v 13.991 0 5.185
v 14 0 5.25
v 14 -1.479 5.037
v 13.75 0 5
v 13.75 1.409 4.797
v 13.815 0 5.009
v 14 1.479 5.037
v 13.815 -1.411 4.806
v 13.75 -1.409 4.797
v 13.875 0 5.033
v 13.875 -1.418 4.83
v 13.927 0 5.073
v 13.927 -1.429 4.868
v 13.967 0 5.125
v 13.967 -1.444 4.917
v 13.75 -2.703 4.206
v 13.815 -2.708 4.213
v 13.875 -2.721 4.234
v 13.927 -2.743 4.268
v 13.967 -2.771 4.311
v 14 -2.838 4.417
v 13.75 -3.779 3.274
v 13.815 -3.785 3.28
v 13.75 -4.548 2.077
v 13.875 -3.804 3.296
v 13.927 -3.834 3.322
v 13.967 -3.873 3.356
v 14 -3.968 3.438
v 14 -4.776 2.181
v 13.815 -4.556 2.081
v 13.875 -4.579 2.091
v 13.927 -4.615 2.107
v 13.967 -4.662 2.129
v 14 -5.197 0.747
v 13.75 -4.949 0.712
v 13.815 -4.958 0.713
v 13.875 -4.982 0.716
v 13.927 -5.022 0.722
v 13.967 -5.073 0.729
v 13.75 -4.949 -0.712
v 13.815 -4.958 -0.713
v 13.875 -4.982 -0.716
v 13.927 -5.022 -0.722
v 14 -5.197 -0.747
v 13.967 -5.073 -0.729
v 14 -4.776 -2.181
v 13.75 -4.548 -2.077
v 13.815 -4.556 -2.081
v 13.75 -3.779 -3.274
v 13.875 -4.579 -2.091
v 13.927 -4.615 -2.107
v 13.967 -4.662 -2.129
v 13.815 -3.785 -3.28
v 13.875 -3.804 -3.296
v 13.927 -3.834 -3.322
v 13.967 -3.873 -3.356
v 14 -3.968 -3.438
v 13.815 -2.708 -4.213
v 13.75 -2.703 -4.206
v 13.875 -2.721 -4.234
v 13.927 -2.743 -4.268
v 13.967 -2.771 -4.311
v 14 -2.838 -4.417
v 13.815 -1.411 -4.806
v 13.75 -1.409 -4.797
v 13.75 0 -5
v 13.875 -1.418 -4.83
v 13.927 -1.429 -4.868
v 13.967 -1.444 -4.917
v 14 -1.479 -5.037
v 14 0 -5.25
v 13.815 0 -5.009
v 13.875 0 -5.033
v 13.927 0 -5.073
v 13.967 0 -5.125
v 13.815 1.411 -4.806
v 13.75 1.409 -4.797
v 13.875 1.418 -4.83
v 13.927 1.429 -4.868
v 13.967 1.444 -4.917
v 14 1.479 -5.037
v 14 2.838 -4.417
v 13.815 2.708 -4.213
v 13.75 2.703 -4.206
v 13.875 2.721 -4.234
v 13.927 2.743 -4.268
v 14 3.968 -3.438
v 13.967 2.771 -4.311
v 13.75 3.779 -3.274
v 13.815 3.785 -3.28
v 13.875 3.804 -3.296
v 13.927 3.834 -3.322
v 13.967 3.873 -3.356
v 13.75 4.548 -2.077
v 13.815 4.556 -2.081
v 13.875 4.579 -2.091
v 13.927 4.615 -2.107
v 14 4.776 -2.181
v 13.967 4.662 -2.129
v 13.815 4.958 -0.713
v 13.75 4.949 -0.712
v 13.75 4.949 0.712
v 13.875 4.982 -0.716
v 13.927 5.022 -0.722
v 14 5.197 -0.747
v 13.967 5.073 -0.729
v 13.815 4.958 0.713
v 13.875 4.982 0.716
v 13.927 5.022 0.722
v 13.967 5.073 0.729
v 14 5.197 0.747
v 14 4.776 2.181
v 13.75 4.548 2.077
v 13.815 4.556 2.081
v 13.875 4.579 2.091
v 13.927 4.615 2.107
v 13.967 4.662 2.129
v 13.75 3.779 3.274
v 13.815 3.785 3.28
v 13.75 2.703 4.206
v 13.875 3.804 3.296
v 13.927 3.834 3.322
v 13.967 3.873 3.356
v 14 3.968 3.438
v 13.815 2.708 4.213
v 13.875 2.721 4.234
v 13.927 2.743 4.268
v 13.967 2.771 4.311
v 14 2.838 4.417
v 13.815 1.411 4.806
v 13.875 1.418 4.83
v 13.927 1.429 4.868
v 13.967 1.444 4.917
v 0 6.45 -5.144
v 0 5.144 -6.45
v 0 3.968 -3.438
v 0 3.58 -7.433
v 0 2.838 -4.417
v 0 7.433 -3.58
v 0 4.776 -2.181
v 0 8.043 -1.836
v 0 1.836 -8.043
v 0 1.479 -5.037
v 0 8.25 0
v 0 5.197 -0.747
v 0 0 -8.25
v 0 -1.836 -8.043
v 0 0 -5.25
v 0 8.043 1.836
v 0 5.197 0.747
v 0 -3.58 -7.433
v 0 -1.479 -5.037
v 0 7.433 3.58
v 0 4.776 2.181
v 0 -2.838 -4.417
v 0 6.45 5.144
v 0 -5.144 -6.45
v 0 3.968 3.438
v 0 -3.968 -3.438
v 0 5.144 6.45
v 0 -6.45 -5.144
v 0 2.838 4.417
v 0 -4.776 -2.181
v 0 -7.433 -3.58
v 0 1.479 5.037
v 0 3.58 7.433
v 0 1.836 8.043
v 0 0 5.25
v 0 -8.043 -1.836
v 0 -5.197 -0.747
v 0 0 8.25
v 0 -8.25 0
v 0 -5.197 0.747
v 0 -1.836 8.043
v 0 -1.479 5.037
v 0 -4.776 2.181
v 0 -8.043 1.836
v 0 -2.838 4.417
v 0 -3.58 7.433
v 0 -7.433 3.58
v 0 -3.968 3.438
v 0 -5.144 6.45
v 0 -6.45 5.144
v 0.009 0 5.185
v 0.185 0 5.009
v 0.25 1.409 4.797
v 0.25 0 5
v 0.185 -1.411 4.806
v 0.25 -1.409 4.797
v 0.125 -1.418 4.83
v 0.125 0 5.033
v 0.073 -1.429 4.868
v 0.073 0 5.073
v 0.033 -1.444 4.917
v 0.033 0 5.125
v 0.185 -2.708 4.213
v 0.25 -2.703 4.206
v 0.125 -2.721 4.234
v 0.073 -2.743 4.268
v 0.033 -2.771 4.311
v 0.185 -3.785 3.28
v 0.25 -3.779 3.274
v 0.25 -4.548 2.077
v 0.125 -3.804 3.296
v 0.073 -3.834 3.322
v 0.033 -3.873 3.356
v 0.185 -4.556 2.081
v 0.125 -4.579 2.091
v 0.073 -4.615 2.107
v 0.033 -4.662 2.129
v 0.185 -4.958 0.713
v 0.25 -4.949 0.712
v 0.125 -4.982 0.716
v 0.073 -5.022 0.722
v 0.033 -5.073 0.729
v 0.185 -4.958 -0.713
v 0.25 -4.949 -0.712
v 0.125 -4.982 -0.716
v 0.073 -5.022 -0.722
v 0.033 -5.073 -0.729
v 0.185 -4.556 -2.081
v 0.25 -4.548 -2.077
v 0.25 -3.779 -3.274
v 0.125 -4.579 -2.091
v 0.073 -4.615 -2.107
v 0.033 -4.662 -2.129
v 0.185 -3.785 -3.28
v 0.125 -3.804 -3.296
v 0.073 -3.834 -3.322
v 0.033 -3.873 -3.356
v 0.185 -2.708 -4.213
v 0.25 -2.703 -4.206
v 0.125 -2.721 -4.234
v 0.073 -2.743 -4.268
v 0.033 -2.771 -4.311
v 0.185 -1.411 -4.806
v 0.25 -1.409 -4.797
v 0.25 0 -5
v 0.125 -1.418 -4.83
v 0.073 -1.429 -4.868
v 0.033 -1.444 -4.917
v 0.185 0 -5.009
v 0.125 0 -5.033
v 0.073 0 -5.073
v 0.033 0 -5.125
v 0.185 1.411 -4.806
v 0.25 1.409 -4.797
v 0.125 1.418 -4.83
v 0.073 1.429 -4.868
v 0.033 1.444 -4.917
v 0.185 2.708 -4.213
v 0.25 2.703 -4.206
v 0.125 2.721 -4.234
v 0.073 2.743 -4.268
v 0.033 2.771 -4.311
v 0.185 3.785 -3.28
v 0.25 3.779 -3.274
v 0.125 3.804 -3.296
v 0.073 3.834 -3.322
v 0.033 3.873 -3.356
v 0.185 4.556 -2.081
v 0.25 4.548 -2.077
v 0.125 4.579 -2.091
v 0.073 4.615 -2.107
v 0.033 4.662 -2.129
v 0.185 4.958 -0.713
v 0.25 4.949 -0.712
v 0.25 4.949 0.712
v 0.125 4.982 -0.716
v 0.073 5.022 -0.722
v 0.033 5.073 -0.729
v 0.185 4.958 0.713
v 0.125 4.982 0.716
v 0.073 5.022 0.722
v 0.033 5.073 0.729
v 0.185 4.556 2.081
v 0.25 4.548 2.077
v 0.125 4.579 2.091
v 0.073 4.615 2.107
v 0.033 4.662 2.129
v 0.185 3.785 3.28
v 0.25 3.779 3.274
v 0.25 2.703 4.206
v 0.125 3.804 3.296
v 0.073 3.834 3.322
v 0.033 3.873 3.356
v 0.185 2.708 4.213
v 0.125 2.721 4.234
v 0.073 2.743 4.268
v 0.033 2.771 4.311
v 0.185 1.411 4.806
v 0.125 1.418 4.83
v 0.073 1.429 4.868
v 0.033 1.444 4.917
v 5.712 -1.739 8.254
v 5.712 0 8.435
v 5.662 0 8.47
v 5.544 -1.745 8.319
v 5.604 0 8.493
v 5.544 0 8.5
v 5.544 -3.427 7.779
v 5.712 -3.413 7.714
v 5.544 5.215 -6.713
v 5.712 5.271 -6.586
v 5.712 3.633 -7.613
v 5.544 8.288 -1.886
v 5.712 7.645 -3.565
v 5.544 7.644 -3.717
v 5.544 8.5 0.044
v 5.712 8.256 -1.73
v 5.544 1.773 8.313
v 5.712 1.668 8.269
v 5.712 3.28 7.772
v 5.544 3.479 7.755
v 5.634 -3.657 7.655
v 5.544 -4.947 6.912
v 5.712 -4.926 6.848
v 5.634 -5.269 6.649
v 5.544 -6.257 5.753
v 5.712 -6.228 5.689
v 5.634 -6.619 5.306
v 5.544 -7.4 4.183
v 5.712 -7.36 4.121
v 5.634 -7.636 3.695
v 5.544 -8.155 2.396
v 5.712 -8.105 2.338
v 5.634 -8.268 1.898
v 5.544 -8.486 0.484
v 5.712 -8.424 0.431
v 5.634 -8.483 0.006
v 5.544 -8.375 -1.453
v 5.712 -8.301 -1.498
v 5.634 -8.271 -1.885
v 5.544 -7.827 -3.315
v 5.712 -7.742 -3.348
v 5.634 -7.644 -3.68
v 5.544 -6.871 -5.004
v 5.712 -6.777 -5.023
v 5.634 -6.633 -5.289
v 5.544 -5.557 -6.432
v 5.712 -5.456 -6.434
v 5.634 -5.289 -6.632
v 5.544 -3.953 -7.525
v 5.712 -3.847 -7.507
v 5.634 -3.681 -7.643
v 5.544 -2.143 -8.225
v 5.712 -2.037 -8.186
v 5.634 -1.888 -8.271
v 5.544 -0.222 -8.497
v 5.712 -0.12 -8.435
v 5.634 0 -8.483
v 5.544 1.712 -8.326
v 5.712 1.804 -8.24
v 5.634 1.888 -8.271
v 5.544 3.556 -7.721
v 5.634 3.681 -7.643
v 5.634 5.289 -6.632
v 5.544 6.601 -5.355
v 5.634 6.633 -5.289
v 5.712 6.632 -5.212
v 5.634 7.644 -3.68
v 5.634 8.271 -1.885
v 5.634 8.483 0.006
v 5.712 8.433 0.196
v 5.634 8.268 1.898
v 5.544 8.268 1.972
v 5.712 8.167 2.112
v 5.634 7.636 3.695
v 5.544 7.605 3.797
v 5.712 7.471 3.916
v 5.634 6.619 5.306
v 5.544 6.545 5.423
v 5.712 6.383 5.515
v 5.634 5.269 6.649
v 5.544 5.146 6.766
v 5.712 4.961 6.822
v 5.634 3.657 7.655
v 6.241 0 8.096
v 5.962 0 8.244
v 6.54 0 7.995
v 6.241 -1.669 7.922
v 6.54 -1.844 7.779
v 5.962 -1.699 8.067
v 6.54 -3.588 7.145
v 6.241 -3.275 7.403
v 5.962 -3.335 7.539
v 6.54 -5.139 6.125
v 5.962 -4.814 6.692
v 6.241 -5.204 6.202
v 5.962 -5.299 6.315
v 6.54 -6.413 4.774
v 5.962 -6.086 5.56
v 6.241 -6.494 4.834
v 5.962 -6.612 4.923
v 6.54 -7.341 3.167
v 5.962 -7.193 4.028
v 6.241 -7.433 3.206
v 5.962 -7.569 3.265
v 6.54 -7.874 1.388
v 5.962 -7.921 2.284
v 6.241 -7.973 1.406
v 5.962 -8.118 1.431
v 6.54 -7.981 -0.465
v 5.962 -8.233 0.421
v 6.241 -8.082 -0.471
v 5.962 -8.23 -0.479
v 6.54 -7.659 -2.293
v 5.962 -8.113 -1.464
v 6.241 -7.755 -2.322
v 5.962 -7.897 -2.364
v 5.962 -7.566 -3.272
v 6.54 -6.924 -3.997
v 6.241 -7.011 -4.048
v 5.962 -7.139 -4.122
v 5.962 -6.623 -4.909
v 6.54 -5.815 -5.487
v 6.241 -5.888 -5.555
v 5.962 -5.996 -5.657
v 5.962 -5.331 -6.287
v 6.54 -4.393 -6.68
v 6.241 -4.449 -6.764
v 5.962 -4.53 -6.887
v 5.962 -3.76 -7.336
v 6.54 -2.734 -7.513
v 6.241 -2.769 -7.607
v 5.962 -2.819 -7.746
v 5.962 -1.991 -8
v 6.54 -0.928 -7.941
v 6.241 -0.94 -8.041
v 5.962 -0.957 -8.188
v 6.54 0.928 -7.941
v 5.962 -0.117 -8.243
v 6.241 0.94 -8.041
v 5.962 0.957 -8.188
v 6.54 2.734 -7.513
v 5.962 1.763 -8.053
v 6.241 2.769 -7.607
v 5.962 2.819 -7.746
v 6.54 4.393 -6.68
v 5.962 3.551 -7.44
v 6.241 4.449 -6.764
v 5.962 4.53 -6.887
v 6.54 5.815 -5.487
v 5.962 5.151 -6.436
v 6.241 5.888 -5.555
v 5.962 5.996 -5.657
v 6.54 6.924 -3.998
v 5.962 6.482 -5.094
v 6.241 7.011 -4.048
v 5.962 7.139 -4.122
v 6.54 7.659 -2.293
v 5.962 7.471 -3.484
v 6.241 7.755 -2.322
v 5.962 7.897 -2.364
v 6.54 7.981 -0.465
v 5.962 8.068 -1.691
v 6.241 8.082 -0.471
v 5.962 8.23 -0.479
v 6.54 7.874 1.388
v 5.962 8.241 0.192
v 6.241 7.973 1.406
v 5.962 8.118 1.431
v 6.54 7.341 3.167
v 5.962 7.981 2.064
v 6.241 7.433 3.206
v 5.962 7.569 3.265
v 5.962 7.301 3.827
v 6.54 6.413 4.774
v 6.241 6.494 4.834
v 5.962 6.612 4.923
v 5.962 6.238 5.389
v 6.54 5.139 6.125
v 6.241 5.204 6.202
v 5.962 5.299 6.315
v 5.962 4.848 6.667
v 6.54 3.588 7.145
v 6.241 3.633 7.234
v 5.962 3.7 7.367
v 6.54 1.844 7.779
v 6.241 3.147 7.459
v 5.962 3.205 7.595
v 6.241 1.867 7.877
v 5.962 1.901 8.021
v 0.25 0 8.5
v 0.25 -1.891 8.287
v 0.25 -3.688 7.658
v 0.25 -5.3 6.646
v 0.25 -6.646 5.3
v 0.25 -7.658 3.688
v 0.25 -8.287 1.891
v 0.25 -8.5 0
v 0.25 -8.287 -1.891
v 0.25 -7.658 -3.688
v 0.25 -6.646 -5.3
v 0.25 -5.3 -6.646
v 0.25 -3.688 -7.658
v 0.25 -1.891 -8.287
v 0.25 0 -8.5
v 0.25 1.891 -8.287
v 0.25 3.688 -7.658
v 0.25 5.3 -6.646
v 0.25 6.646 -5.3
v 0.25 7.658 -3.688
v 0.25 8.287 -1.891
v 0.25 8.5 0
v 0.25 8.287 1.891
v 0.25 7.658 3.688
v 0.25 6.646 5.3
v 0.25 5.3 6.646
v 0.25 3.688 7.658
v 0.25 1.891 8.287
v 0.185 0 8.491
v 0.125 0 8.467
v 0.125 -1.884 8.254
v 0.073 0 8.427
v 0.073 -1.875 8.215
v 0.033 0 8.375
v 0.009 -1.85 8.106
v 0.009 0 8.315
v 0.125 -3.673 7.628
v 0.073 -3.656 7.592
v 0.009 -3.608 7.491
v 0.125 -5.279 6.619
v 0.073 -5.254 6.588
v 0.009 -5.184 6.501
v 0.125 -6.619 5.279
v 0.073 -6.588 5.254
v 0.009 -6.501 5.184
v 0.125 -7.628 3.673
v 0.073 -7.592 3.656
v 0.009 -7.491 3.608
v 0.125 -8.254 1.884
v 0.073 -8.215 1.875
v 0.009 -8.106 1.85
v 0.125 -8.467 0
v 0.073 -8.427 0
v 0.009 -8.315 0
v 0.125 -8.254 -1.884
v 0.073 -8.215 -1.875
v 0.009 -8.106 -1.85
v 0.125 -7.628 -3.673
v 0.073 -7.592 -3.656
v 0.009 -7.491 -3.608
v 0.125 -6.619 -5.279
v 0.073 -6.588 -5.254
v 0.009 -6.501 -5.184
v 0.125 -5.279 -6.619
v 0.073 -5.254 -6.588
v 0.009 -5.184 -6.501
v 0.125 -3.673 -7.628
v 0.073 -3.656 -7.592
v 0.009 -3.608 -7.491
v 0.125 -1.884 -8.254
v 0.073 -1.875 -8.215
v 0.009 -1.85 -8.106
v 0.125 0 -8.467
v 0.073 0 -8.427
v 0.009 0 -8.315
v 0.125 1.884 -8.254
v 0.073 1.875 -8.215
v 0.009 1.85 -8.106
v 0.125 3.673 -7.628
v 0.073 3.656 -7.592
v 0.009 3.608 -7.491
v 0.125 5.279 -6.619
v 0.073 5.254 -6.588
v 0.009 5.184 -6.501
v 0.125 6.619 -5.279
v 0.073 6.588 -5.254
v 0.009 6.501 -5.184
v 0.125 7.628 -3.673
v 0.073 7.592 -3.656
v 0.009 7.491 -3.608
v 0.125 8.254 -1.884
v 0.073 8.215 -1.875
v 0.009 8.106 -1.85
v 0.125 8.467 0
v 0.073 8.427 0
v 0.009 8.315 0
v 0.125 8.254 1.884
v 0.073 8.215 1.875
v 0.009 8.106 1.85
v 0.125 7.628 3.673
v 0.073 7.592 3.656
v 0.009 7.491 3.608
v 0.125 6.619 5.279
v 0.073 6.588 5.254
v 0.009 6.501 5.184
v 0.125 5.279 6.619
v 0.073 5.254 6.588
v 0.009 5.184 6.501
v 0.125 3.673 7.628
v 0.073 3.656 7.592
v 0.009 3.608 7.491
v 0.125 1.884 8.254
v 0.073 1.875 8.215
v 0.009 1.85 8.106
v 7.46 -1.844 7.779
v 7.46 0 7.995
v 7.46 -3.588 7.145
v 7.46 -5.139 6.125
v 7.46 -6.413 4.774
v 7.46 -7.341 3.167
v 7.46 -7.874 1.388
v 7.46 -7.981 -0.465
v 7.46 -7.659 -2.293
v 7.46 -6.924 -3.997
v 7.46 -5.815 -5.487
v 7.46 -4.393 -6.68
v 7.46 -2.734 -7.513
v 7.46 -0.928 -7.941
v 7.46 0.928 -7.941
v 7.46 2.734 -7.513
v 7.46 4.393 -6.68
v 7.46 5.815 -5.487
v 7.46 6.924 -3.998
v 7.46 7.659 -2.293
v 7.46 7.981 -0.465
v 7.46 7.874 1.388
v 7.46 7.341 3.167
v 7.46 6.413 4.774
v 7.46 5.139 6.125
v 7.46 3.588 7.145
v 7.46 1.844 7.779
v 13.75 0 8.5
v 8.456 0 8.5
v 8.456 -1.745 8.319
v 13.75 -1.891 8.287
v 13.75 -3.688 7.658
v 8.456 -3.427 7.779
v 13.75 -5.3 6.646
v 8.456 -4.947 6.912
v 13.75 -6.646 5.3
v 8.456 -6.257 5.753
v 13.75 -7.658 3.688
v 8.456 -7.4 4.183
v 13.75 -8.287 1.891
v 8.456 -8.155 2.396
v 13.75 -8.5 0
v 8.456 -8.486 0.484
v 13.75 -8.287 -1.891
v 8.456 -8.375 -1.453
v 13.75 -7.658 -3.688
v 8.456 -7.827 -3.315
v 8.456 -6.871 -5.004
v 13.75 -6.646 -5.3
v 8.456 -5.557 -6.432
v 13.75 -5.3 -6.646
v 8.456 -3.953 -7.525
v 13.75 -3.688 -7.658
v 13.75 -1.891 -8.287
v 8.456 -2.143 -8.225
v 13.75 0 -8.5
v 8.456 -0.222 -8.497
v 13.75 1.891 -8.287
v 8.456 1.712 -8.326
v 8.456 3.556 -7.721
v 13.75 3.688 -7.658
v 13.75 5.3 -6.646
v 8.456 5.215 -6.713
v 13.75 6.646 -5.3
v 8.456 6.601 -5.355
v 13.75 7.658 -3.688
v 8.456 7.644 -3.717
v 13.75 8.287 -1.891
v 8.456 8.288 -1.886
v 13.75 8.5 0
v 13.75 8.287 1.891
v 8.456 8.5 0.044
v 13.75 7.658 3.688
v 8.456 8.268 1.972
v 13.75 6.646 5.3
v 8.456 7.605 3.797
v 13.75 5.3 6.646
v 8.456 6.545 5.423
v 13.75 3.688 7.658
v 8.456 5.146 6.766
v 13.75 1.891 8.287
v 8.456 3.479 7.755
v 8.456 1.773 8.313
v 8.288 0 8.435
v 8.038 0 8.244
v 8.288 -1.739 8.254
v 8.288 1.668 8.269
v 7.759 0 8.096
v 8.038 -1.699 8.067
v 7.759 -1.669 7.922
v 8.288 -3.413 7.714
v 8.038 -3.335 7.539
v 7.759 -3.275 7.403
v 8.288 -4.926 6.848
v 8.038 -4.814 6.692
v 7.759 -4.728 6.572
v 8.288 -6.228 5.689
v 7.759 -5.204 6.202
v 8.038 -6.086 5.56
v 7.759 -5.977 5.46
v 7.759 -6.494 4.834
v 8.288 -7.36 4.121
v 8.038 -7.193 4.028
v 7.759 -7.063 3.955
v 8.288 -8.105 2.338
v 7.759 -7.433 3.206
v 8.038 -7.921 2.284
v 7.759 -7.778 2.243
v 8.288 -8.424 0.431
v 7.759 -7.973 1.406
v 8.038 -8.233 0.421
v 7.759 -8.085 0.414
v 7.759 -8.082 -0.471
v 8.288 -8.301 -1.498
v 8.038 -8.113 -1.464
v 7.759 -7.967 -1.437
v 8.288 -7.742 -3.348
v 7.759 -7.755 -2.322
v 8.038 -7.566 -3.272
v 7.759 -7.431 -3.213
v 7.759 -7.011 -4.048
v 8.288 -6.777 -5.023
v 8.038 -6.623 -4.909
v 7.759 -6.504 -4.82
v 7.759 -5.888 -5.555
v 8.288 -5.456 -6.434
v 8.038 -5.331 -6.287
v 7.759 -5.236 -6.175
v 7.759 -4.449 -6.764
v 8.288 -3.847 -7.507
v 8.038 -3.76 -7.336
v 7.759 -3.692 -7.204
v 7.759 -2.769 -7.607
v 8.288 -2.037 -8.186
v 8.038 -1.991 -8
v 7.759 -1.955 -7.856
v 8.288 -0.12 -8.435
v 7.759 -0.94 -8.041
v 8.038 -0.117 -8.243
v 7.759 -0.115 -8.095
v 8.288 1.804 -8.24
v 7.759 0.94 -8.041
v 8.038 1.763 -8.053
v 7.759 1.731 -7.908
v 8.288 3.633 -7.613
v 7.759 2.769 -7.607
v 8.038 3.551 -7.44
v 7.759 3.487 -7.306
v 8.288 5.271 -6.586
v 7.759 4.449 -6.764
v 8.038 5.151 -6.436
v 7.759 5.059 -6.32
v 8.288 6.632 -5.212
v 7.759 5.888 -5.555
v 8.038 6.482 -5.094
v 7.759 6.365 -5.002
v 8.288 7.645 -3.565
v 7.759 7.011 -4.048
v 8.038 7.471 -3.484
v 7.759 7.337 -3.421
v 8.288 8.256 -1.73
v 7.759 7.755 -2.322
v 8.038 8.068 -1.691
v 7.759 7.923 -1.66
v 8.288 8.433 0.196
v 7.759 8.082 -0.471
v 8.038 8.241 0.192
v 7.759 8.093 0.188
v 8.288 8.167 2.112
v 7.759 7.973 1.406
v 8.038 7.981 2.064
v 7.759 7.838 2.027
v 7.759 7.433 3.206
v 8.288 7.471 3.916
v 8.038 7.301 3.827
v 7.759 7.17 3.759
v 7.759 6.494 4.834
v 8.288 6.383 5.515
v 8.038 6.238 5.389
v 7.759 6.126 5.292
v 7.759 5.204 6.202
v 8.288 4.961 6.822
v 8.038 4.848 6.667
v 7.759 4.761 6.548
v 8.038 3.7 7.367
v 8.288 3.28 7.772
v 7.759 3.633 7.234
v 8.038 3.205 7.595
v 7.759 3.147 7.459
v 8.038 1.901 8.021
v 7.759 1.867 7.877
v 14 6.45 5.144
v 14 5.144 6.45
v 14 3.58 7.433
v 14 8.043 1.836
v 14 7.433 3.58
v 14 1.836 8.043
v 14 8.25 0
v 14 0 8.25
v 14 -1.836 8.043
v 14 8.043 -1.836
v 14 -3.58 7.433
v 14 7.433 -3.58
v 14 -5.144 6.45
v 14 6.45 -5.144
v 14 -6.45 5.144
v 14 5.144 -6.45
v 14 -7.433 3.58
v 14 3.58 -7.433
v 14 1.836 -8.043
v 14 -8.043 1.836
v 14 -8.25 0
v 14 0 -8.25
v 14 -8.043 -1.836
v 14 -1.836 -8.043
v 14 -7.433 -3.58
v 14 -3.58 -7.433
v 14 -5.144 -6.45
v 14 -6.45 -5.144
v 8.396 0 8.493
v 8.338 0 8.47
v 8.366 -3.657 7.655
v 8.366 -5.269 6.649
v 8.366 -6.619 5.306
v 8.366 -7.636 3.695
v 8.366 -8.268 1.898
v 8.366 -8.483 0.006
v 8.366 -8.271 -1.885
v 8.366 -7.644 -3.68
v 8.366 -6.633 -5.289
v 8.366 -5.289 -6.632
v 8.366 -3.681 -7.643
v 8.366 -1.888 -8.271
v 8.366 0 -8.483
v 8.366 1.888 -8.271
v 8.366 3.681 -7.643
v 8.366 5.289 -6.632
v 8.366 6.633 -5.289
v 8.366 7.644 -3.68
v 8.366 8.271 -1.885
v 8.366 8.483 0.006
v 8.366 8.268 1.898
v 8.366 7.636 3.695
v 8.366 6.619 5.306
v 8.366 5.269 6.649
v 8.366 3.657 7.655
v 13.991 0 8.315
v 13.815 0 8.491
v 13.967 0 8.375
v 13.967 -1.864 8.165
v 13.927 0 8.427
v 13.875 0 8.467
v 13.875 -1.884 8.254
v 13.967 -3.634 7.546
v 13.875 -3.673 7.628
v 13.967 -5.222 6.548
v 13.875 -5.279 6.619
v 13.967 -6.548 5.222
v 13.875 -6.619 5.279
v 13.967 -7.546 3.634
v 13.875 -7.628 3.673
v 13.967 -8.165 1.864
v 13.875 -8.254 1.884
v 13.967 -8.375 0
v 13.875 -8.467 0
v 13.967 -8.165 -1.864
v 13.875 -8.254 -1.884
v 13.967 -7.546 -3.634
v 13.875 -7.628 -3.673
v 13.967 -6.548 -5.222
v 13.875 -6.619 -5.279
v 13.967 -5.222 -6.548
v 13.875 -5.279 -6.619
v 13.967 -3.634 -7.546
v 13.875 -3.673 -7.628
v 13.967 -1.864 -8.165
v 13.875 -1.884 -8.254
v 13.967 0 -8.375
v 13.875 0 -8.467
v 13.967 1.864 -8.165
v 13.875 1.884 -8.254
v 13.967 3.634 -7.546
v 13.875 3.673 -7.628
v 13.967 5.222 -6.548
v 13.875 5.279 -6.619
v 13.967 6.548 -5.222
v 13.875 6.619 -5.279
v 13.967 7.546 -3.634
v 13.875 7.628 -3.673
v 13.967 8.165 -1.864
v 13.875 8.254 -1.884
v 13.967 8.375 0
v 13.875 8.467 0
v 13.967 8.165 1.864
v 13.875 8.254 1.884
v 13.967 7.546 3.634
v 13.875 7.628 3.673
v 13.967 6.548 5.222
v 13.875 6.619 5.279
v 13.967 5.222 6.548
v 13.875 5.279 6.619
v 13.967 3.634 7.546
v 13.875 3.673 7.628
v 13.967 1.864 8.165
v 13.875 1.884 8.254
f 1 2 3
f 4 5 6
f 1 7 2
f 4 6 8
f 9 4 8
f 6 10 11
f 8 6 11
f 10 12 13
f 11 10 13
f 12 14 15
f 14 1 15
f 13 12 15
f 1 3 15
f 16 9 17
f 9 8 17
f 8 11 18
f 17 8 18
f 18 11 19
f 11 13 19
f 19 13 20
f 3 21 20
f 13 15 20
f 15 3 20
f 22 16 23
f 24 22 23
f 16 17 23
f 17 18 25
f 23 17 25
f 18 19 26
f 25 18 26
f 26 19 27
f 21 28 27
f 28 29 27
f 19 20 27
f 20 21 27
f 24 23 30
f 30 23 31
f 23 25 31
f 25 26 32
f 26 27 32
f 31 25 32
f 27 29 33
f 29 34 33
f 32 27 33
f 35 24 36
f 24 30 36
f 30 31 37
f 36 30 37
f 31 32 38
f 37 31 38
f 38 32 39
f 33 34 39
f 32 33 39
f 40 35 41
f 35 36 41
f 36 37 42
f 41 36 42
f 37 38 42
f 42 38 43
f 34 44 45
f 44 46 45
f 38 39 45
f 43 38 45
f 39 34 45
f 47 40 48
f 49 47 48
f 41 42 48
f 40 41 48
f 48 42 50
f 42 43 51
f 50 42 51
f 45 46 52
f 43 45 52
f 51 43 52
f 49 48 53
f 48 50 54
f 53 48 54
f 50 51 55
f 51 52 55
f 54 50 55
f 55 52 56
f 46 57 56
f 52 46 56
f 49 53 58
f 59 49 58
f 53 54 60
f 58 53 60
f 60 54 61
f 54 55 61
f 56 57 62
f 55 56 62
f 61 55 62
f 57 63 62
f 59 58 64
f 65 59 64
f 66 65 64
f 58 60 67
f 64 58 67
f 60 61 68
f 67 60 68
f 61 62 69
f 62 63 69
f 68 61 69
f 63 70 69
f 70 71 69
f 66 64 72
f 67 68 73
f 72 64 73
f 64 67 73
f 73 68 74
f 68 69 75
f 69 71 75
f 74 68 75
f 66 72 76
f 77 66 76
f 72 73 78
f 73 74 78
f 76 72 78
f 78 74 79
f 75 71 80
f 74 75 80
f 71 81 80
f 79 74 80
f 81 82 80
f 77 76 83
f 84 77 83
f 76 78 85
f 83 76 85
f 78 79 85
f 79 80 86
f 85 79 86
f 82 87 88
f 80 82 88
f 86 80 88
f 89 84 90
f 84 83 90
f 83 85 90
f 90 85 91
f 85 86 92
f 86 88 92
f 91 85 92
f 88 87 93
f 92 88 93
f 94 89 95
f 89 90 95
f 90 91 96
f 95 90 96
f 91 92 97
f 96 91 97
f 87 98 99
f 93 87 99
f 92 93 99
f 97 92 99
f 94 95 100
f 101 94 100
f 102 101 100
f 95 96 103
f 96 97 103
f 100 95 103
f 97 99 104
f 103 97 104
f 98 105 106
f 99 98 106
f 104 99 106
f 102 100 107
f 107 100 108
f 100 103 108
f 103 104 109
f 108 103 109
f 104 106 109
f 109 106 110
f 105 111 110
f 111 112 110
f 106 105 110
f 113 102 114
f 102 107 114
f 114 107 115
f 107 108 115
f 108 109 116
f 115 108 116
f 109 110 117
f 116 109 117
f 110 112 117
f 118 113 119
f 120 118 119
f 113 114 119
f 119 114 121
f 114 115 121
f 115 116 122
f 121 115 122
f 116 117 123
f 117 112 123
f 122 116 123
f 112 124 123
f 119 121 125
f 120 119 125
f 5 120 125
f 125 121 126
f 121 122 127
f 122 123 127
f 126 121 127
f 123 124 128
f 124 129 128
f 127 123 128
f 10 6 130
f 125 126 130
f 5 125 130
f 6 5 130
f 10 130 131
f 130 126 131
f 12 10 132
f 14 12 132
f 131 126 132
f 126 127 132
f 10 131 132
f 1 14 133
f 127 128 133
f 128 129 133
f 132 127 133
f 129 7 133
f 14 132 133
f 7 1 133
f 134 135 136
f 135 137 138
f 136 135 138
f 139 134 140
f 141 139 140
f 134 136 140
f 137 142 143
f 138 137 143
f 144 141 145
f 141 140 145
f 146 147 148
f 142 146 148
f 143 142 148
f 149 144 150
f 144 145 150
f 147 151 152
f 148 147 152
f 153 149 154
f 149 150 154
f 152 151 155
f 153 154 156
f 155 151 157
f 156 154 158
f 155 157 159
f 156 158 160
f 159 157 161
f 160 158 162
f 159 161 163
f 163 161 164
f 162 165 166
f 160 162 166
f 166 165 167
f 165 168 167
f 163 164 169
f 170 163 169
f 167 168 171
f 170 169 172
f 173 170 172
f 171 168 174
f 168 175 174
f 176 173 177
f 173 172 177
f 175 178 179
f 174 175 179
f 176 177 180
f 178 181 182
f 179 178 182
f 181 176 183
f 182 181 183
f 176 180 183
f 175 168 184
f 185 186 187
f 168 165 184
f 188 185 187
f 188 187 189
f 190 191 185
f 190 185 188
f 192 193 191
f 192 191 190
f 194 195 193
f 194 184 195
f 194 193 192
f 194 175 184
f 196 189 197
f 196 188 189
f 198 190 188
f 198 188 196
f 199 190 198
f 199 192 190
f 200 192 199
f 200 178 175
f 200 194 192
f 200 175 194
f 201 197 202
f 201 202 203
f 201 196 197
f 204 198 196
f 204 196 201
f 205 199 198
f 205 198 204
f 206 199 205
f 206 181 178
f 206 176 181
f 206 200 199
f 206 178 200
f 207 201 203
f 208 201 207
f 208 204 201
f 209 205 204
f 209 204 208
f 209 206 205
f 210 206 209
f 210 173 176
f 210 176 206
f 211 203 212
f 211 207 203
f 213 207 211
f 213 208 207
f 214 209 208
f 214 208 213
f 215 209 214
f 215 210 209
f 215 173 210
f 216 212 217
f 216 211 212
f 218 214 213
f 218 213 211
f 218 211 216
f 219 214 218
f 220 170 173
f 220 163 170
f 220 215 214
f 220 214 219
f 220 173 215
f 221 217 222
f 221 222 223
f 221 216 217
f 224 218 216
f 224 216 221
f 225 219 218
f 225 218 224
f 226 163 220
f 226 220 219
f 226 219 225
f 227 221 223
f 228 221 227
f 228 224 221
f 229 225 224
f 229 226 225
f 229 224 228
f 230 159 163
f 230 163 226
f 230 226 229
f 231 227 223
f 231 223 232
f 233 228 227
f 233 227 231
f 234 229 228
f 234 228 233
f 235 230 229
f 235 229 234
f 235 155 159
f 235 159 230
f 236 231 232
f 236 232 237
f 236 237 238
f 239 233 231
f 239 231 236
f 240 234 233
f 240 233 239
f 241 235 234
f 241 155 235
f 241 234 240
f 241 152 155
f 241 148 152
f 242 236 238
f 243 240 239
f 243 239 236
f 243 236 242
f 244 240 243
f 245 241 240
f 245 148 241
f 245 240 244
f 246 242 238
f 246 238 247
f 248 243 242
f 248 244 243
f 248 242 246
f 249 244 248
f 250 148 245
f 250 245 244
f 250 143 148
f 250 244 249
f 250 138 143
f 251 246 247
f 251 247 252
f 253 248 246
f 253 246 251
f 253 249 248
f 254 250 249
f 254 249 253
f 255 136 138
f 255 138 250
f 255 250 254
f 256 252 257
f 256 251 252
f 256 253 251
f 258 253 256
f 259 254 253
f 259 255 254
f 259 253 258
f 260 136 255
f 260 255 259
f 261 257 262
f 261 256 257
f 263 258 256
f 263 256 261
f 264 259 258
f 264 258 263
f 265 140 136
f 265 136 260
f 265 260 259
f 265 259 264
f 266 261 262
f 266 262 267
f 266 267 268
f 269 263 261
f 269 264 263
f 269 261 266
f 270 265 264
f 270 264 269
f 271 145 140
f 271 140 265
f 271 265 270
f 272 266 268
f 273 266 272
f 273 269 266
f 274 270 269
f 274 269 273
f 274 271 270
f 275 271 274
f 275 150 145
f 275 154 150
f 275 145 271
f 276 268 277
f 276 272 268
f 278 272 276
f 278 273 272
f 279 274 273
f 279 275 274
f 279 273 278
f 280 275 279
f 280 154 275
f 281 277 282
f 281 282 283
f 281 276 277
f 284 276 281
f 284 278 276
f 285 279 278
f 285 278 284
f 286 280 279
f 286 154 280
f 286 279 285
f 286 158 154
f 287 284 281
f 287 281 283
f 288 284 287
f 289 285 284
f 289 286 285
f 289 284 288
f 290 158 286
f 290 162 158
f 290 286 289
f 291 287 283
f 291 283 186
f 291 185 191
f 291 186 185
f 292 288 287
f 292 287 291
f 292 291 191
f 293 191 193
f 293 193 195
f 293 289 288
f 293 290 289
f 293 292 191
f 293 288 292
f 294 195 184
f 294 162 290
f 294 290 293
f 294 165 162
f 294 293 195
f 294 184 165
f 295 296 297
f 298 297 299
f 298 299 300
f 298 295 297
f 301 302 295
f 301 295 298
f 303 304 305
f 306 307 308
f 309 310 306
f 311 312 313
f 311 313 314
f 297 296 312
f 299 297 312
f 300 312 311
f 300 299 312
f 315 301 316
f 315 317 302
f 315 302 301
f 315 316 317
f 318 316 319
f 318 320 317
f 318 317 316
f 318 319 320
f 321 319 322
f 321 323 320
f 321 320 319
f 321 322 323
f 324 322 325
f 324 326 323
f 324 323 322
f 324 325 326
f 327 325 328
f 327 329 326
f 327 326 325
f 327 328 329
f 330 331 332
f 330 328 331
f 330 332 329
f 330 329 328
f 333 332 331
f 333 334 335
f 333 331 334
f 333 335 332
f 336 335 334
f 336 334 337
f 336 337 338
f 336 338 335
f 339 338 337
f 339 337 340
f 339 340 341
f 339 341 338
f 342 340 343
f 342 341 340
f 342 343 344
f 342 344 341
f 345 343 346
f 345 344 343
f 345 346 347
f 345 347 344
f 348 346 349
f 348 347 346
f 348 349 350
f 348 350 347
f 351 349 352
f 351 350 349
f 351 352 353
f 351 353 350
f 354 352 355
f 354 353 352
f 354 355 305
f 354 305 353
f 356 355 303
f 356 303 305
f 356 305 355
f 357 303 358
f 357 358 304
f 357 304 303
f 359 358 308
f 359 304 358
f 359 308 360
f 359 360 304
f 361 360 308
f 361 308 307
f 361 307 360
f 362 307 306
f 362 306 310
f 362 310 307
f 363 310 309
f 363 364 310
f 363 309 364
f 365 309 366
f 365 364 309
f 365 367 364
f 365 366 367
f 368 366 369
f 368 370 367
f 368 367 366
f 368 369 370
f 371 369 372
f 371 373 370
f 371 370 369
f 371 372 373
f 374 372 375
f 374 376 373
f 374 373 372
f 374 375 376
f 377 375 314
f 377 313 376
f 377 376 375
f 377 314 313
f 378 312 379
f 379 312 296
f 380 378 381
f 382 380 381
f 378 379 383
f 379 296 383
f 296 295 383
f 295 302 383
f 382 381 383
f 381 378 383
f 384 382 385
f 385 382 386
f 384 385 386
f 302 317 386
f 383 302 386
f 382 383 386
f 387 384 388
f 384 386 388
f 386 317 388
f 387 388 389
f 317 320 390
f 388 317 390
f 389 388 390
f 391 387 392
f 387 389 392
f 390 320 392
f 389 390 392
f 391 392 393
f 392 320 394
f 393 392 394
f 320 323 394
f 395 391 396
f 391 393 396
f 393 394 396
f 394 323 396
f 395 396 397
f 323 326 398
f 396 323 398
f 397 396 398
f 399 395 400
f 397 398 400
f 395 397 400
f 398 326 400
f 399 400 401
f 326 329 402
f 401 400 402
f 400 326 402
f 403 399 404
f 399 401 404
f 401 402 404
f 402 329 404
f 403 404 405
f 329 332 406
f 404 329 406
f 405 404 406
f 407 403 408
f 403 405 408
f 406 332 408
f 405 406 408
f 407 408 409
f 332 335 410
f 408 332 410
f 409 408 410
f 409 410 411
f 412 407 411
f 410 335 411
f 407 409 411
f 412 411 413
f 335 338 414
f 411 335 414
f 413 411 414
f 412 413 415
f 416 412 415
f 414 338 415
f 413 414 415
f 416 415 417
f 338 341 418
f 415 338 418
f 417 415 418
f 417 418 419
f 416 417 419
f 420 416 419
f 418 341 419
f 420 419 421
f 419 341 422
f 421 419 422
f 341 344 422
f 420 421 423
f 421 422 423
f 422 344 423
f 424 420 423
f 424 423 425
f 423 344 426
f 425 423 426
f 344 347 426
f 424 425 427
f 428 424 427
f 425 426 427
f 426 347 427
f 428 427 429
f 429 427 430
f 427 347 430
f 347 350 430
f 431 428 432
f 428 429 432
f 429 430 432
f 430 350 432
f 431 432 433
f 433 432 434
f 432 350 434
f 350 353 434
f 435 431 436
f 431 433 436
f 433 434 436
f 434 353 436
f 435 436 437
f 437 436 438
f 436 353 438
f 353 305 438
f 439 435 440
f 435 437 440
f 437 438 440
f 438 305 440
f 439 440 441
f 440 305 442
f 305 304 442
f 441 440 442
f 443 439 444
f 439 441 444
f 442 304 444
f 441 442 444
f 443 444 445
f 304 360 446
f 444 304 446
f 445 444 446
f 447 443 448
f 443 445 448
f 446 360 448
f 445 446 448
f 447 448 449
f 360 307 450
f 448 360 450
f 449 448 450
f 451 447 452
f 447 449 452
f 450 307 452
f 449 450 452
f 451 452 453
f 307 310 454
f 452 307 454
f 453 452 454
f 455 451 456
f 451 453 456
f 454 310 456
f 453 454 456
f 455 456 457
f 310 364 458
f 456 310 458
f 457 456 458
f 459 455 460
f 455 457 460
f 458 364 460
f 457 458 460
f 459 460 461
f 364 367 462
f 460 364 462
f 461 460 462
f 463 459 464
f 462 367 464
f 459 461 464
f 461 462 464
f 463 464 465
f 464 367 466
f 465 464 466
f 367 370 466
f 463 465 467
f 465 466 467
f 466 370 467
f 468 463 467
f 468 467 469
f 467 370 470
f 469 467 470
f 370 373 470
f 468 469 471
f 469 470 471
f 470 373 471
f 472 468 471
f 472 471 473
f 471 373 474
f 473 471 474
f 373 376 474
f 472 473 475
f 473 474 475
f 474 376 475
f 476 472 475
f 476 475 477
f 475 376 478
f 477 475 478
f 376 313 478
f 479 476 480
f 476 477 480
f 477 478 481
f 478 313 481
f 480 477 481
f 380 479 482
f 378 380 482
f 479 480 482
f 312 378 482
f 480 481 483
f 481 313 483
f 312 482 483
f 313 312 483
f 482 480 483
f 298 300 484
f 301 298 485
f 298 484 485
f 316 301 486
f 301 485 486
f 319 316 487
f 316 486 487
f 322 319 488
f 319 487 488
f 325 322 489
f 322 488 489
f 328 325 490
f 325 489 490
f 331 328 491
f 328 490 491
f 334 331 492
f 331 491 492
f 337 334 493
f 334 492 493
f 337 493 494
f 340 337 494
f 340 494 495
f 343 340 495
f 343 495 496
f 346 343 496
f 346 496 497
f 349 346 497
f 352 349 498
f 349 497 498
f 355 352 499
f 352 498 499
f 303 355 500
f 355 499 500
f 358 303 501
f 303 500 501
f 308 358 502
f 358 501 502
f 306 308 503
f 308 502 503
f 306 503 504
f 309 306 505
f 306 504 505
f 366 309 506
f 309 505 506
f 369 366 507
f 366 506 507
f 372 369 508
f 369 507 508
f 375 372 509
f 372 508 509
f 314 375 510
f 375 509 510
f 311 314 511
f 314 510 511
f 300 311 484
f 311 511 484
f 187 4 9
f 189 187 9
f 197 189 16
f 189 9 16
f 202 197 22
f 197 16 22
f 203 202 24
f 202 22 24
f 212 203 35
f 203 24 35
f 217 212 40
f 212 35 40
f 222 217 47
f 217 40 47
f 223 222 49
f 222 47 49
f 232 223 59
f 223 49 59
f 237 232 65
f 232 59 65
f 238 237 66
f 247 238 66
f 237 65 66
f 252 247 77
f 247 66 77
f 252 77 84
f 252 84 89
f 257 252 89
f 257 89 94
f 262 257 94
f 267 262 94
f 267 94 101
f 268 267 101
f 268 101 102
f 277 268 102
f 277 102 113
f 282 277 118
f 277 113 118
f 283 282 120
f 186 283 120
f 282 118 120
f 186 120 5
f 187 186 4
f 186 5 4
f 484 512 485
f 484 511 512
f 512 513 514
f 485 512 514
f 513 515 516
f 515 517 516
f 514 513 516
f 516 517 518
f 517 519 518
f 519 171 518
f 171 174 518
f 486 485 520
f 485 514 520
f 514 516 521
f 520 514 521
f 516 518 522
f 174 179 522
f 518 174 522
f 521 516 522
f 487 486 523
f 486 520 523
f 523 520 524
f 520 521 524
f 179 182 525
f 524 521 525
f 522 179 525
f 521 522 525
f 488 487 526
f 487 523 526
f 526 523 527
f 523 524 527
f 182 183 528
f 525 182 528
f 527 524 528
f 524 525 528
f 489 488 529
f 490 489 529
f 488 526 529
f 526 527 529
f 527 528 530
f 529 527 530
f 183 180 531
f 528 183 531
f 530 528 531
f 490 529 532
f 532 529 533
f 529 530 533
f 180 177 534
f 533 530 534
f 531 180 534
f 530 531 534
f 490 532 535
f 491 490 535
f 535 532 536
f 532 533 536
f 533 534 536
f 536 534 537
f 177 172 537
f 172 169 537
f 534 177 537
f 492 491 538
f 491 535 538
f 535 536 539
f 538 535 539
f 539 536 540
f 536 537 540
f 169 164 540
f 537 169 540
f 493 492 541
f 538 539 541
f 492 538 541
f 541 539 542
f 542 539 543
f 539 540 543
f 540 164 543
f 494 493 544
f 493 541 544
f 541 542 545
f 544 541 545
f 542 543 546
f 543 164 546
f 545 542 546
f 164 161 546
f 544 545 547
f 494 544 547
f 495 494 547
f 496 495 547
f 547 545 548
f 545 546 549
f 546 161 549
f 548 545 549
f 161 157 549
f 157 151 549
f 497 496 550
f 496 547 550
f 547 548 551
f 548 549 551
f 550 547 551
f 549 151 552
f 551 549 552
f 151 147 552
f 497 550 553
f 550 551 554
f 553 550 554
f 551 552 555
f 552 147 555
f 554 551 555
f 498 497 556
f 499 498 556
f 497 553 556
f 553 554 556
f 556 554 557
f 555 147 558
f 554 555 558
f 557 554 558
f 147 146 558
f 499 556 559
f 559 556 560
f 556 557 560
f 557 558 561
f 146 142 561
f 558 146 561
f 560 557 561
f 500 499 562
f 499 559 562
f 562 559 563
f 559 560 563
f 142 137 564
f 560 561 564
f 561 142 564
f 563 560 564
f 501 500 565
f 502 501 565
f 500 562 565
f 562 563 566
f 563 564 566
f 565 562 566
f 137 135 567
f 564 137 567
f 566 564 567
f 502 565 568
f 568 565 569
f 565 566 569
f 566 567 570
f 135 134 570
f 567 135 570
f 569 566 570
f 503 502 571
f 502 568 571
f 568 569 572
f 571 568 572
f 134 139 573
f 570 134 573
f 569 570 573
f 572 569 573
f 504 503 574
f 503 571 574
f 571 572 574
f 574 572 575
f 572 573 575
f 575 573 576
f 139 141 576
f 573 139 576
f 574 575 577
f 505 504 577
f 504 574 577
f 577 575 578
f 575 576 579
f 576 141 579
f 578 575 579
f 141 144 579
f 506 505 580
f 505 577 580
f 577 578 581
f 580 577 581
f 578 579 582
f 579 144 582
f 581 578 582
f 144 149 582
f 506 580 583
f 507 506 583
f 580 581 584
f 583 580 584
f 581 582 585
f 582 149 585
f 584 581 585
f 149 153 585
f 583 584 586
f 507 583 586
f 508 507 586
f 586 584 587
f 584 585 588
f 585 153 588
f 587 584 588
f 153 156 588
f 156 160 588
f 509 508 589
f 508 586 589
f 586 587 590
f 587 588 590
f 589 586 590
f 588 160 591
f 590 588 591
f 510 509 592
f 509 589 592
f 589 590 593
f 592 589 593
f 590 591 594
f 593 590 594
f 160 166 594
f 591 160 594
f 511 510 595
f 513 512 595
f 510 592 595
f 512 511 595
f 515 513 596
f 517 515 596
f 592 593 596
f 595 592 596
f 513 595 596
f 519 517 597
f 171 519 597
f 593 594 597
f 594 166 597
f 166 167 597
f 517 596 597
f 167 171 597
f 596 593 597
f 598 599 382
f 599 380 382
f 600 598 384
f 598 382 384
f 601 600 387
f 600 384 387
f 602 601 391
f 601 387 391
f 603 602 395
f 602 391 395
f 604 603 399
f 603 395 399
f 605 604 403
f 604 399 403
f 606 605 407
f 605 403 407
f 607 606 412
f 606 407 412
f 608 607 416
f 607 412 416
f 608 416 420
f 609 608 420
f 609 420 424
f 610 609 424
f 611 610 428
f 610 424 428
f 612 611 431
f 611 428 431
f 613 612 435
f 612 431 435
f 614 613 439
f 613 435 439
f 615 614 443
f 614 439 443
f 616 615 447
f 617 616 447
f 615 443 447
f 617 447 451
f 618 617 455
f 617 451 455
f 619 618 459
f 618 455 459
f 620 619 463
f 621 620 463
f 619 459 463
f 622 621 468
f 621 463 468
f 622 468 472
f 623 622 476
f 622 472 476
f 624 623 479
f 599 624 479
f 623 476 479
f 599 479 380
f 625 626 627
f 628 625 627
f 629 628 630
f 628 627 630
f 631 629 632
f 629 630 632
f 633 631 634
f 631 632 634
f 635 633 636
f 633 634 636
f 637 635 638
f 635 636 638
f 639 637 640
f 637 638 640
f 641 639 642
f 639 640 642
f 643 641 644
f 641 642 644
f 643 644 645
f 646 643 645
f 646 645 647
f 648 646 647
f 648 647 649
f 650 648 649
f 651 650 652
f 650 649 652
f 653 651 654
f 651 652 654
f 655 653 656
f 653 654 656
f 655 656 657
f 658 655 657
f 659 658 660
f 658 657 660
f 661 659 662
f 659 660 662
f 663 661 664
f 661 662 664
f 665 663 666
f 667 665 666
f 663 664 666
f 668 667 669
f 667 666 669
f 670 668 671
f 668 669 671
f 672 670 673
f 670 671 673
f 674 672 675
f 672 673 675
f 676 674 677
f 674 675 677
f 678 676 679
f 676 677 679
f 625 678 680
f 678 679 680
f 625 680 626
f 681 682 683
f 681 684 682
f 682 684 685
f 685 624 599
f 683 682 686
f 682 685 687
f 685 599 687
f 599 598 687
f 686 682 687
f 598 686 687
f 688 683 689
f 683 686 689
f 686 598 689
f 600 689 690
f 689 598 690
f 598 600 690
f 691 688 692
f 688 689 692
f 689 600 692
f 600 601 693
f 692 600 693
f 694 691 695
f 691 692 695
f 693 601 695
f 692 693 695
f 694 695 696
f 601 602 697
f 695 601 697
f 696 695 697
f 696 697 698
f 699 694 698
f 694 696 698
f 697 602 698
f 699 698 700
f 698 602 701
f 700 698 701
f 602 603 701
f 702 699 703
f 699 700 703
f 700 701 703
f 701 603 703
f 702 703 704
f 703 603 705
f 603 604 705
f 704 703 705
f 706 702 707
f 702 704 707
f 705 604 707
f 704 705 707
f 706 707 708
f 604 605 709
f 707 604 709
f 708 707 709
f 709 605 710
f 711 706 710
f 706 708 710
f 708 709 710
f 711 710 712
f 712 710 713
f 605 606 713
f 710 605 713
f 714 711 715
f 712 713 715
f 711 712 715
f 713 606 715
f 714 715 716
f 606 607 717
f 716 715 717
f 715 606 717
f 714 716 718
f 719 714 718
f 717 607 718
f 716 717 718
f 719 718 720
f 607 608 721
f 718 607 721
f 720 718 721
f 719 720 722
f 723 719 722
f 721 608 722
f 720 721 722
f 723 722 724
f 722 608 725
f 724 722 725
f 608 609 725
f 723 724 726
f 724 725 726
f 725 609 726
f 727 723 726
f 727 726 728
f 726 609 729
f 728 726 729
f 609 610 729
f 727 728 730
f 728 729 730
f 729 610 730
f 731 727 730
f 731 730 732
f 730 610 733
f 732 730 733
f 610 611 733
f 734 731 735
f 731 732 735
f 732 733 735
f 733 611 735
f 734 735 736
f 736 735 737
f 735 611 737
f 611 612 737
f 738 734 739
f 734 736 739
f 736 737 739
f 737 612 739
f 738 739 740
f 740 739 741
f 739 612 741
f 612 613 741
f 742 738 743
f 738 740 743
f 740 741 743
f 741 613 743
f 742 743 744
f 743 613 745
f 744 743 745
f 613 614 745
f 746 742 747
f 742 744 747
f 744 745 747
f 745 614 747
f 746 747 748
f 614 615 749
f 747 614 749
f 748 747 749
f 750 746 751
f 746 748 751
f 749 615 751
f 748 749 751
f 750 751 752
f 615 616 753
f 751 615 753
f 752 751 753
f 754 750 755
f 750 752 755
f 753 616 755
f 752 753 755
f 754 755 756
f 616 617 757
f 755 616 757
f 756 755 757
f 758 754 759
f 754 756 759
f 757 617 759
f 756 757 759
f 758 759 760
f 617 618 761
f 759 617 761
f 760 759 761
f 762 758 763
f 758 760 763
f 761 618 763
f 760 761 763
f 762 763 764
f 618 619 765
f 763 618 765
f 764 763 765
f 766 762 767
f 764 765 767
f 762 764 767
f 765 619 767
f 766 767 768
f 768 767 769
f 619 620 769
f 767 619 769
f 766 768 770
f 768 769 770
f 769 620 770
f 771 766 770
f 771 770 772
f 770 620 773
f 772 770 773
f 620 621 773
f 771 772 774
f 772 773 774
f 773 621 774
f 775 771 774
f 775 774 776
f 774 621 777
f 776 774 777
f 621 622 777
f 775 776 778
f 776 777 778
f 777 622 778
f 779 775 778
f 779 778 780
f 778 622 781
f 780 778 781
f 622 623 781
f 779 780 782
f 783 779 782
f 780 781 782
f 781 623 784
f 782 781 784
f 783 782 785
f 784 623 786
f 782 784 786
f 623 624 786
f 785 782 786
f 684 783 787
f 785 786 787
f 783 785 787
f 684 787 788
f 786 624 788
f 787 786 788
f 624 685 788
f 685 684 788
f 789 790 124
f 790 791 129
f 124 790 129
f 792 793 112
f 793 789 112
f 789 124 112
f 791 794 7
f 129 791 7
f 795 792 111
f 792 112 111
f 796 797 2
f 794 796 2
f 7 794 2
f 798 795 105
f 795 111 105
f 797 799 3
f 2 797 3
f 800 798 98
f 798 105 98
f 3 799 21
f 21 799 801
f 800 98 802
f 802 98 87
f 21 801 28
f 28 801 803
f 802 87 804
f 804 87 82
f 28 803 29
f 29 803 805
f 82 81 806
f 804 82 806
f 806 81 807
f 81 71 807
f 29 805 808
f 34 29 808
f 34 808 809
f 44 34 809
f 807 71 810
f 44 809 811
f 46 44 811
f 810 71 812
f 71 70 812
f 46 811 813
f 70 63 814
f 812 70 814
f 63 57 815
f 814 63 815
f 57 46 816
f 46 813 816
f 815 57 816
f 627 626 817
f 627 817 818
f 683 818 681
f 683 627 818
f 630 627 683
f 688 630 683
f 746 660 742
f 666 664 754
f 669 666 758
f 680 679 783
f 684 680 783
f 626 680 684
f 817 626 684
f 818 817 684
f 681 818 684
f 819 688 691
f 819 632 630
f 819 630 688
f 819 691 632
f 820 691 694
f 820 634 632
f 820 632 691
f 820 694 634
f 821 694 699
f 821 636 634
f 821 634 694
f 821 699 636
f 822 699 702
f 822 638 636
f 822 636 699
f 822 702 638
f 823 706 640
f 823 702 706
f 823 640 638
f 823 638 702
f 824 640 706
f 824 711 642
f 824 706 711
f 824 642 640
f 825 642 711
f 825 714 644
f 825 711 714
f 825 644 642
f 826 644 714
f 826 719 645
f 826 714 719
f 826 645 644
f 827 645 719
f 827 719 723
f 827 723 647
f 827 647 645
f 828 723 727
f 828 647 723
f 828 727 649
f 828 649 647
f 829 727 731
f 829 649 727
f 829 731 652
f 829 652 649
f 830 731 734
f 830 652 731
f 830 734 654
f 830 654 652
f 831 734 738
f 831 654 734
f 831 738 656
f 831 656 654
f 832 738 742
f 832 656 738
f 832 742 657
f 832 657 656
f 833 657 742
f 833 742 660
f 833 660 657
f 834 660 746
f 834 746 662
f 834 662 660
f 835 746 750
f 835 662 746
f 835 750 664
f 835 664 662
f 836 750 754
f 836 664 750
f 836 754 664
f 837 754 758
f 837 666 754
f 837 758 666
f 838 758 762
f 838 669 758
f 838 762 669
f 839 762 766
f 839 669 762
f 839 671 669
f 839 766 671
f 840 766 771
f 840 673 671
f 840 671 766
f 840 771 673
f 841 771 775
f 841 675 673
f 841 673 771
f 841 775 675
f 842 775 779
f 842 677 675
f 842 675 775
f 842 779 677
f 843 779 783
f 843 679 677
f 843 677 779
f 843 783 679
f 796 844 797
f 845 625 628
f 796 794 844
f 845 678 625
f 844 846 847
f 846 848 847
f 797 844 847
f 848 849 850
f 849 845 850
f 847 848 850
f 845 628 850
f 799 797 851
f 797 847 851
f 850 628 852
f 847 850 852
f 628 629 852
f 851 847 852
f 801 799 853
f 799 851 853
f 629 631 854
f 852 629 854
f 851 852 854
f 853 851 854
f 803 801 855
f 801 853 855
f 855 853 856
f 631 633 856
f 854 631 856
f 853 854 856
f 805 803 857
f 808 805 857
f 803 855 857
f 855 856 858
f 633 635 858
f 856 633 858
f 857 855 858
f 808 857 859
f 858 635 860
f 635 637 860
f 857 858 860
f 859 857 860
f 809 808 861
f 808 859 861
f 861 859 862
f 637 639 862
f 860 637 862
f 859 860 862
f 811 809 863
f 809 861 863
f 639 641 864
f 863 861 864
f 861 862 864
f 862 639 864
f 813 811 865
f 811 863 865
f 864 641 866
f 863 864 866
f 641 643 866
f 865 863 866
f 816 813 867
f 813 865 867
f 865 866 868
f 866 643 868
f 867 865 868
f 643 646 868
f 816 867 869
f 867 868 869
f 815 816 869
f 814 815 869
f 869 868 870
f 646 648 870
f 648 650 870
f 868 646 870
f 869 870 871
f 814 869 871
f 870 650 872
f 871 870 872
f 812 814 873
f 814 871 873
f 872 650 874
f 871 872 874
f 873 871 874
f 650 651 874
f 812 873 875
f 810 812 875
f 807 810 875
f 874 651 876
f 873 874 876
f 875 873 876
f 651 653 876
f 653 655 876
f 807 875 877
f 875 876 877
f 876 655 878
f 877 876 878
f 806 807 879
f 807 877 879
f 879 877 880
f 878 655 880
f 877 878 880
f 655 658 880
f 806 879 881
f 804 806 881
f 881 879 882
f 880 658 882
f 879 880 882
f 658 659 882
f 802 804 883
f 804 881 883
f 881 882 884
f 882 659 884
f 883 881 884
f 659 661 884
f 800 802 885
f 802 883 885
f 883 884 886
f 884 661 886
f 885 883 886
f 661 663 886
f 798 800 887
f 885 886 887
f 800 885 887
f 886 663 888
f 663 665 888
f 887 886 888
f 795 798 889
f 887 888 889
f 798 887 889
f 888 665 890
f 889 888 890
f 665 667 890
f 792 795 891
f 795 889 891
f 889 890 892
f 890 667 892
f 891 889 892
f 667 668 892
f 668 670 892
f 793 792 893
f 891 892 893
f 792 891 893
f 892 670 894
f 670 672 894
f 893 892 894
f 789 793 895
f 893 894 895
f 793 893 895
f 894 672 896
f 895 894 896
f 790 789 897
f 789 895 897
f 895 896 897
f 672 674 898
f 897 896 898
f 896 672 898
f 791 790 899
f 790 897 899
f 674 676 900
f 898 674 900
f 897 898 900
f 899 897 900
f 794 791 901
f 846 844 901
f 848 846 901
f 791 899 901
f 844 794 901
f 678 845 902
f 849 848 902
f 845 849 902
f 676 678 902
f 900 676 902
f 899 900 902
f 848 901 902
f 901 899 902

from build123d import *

# Parameters (mm, degrees)
FILLET1_R = 0.25


with BuildPart() as part:
    # Sketch1 → Revolve1 (revolve)
    with BuildSketch(Plane.XY, mode=Mode.PRIVATE) as revolve1_sk:
        with BuildLine():
            Line((0, 5), (14, 5))
            Line((14, 5), (14, 8.5))
            Line((14, 8.5), (8.356206975, 8.5))
            ThreePointArc((8.356206975, 8.5), (7.94255408, 8.186361661), (7.46, 7.995))
            Line((7.46, 7.995), (6.54, 7.995))
            ThreePointArc((6.54, 7.995), (6.05744592, 8.186361661), (5.643793025, 8.5))
            Line((5.643793025, 8.5), (0, 8.5))
            Line((0, 8.5), (0, 5))
        make_face()
    revolve(revolve1_sk.sketch.rotate(Axis((0, 0, 0), (1, 0, 0)), 90), axis=Axis((0, 0, 0), (1, 0, 0)))

    # Fillet1
    fillet1_edges = [part.edges().sort_by_distance(p)[0] for p in [
        (0, 0, -8.5),
        (5.643793025, 0, -8.5),
        (8.356206975, 0, -8.5),
        (14, 0, -8.5),
        (14, 0, -5),
        (0, 0, -5),
    ]]
    fillet(fillet1_edges, radius=FILLET1_R)


solid = part.part
